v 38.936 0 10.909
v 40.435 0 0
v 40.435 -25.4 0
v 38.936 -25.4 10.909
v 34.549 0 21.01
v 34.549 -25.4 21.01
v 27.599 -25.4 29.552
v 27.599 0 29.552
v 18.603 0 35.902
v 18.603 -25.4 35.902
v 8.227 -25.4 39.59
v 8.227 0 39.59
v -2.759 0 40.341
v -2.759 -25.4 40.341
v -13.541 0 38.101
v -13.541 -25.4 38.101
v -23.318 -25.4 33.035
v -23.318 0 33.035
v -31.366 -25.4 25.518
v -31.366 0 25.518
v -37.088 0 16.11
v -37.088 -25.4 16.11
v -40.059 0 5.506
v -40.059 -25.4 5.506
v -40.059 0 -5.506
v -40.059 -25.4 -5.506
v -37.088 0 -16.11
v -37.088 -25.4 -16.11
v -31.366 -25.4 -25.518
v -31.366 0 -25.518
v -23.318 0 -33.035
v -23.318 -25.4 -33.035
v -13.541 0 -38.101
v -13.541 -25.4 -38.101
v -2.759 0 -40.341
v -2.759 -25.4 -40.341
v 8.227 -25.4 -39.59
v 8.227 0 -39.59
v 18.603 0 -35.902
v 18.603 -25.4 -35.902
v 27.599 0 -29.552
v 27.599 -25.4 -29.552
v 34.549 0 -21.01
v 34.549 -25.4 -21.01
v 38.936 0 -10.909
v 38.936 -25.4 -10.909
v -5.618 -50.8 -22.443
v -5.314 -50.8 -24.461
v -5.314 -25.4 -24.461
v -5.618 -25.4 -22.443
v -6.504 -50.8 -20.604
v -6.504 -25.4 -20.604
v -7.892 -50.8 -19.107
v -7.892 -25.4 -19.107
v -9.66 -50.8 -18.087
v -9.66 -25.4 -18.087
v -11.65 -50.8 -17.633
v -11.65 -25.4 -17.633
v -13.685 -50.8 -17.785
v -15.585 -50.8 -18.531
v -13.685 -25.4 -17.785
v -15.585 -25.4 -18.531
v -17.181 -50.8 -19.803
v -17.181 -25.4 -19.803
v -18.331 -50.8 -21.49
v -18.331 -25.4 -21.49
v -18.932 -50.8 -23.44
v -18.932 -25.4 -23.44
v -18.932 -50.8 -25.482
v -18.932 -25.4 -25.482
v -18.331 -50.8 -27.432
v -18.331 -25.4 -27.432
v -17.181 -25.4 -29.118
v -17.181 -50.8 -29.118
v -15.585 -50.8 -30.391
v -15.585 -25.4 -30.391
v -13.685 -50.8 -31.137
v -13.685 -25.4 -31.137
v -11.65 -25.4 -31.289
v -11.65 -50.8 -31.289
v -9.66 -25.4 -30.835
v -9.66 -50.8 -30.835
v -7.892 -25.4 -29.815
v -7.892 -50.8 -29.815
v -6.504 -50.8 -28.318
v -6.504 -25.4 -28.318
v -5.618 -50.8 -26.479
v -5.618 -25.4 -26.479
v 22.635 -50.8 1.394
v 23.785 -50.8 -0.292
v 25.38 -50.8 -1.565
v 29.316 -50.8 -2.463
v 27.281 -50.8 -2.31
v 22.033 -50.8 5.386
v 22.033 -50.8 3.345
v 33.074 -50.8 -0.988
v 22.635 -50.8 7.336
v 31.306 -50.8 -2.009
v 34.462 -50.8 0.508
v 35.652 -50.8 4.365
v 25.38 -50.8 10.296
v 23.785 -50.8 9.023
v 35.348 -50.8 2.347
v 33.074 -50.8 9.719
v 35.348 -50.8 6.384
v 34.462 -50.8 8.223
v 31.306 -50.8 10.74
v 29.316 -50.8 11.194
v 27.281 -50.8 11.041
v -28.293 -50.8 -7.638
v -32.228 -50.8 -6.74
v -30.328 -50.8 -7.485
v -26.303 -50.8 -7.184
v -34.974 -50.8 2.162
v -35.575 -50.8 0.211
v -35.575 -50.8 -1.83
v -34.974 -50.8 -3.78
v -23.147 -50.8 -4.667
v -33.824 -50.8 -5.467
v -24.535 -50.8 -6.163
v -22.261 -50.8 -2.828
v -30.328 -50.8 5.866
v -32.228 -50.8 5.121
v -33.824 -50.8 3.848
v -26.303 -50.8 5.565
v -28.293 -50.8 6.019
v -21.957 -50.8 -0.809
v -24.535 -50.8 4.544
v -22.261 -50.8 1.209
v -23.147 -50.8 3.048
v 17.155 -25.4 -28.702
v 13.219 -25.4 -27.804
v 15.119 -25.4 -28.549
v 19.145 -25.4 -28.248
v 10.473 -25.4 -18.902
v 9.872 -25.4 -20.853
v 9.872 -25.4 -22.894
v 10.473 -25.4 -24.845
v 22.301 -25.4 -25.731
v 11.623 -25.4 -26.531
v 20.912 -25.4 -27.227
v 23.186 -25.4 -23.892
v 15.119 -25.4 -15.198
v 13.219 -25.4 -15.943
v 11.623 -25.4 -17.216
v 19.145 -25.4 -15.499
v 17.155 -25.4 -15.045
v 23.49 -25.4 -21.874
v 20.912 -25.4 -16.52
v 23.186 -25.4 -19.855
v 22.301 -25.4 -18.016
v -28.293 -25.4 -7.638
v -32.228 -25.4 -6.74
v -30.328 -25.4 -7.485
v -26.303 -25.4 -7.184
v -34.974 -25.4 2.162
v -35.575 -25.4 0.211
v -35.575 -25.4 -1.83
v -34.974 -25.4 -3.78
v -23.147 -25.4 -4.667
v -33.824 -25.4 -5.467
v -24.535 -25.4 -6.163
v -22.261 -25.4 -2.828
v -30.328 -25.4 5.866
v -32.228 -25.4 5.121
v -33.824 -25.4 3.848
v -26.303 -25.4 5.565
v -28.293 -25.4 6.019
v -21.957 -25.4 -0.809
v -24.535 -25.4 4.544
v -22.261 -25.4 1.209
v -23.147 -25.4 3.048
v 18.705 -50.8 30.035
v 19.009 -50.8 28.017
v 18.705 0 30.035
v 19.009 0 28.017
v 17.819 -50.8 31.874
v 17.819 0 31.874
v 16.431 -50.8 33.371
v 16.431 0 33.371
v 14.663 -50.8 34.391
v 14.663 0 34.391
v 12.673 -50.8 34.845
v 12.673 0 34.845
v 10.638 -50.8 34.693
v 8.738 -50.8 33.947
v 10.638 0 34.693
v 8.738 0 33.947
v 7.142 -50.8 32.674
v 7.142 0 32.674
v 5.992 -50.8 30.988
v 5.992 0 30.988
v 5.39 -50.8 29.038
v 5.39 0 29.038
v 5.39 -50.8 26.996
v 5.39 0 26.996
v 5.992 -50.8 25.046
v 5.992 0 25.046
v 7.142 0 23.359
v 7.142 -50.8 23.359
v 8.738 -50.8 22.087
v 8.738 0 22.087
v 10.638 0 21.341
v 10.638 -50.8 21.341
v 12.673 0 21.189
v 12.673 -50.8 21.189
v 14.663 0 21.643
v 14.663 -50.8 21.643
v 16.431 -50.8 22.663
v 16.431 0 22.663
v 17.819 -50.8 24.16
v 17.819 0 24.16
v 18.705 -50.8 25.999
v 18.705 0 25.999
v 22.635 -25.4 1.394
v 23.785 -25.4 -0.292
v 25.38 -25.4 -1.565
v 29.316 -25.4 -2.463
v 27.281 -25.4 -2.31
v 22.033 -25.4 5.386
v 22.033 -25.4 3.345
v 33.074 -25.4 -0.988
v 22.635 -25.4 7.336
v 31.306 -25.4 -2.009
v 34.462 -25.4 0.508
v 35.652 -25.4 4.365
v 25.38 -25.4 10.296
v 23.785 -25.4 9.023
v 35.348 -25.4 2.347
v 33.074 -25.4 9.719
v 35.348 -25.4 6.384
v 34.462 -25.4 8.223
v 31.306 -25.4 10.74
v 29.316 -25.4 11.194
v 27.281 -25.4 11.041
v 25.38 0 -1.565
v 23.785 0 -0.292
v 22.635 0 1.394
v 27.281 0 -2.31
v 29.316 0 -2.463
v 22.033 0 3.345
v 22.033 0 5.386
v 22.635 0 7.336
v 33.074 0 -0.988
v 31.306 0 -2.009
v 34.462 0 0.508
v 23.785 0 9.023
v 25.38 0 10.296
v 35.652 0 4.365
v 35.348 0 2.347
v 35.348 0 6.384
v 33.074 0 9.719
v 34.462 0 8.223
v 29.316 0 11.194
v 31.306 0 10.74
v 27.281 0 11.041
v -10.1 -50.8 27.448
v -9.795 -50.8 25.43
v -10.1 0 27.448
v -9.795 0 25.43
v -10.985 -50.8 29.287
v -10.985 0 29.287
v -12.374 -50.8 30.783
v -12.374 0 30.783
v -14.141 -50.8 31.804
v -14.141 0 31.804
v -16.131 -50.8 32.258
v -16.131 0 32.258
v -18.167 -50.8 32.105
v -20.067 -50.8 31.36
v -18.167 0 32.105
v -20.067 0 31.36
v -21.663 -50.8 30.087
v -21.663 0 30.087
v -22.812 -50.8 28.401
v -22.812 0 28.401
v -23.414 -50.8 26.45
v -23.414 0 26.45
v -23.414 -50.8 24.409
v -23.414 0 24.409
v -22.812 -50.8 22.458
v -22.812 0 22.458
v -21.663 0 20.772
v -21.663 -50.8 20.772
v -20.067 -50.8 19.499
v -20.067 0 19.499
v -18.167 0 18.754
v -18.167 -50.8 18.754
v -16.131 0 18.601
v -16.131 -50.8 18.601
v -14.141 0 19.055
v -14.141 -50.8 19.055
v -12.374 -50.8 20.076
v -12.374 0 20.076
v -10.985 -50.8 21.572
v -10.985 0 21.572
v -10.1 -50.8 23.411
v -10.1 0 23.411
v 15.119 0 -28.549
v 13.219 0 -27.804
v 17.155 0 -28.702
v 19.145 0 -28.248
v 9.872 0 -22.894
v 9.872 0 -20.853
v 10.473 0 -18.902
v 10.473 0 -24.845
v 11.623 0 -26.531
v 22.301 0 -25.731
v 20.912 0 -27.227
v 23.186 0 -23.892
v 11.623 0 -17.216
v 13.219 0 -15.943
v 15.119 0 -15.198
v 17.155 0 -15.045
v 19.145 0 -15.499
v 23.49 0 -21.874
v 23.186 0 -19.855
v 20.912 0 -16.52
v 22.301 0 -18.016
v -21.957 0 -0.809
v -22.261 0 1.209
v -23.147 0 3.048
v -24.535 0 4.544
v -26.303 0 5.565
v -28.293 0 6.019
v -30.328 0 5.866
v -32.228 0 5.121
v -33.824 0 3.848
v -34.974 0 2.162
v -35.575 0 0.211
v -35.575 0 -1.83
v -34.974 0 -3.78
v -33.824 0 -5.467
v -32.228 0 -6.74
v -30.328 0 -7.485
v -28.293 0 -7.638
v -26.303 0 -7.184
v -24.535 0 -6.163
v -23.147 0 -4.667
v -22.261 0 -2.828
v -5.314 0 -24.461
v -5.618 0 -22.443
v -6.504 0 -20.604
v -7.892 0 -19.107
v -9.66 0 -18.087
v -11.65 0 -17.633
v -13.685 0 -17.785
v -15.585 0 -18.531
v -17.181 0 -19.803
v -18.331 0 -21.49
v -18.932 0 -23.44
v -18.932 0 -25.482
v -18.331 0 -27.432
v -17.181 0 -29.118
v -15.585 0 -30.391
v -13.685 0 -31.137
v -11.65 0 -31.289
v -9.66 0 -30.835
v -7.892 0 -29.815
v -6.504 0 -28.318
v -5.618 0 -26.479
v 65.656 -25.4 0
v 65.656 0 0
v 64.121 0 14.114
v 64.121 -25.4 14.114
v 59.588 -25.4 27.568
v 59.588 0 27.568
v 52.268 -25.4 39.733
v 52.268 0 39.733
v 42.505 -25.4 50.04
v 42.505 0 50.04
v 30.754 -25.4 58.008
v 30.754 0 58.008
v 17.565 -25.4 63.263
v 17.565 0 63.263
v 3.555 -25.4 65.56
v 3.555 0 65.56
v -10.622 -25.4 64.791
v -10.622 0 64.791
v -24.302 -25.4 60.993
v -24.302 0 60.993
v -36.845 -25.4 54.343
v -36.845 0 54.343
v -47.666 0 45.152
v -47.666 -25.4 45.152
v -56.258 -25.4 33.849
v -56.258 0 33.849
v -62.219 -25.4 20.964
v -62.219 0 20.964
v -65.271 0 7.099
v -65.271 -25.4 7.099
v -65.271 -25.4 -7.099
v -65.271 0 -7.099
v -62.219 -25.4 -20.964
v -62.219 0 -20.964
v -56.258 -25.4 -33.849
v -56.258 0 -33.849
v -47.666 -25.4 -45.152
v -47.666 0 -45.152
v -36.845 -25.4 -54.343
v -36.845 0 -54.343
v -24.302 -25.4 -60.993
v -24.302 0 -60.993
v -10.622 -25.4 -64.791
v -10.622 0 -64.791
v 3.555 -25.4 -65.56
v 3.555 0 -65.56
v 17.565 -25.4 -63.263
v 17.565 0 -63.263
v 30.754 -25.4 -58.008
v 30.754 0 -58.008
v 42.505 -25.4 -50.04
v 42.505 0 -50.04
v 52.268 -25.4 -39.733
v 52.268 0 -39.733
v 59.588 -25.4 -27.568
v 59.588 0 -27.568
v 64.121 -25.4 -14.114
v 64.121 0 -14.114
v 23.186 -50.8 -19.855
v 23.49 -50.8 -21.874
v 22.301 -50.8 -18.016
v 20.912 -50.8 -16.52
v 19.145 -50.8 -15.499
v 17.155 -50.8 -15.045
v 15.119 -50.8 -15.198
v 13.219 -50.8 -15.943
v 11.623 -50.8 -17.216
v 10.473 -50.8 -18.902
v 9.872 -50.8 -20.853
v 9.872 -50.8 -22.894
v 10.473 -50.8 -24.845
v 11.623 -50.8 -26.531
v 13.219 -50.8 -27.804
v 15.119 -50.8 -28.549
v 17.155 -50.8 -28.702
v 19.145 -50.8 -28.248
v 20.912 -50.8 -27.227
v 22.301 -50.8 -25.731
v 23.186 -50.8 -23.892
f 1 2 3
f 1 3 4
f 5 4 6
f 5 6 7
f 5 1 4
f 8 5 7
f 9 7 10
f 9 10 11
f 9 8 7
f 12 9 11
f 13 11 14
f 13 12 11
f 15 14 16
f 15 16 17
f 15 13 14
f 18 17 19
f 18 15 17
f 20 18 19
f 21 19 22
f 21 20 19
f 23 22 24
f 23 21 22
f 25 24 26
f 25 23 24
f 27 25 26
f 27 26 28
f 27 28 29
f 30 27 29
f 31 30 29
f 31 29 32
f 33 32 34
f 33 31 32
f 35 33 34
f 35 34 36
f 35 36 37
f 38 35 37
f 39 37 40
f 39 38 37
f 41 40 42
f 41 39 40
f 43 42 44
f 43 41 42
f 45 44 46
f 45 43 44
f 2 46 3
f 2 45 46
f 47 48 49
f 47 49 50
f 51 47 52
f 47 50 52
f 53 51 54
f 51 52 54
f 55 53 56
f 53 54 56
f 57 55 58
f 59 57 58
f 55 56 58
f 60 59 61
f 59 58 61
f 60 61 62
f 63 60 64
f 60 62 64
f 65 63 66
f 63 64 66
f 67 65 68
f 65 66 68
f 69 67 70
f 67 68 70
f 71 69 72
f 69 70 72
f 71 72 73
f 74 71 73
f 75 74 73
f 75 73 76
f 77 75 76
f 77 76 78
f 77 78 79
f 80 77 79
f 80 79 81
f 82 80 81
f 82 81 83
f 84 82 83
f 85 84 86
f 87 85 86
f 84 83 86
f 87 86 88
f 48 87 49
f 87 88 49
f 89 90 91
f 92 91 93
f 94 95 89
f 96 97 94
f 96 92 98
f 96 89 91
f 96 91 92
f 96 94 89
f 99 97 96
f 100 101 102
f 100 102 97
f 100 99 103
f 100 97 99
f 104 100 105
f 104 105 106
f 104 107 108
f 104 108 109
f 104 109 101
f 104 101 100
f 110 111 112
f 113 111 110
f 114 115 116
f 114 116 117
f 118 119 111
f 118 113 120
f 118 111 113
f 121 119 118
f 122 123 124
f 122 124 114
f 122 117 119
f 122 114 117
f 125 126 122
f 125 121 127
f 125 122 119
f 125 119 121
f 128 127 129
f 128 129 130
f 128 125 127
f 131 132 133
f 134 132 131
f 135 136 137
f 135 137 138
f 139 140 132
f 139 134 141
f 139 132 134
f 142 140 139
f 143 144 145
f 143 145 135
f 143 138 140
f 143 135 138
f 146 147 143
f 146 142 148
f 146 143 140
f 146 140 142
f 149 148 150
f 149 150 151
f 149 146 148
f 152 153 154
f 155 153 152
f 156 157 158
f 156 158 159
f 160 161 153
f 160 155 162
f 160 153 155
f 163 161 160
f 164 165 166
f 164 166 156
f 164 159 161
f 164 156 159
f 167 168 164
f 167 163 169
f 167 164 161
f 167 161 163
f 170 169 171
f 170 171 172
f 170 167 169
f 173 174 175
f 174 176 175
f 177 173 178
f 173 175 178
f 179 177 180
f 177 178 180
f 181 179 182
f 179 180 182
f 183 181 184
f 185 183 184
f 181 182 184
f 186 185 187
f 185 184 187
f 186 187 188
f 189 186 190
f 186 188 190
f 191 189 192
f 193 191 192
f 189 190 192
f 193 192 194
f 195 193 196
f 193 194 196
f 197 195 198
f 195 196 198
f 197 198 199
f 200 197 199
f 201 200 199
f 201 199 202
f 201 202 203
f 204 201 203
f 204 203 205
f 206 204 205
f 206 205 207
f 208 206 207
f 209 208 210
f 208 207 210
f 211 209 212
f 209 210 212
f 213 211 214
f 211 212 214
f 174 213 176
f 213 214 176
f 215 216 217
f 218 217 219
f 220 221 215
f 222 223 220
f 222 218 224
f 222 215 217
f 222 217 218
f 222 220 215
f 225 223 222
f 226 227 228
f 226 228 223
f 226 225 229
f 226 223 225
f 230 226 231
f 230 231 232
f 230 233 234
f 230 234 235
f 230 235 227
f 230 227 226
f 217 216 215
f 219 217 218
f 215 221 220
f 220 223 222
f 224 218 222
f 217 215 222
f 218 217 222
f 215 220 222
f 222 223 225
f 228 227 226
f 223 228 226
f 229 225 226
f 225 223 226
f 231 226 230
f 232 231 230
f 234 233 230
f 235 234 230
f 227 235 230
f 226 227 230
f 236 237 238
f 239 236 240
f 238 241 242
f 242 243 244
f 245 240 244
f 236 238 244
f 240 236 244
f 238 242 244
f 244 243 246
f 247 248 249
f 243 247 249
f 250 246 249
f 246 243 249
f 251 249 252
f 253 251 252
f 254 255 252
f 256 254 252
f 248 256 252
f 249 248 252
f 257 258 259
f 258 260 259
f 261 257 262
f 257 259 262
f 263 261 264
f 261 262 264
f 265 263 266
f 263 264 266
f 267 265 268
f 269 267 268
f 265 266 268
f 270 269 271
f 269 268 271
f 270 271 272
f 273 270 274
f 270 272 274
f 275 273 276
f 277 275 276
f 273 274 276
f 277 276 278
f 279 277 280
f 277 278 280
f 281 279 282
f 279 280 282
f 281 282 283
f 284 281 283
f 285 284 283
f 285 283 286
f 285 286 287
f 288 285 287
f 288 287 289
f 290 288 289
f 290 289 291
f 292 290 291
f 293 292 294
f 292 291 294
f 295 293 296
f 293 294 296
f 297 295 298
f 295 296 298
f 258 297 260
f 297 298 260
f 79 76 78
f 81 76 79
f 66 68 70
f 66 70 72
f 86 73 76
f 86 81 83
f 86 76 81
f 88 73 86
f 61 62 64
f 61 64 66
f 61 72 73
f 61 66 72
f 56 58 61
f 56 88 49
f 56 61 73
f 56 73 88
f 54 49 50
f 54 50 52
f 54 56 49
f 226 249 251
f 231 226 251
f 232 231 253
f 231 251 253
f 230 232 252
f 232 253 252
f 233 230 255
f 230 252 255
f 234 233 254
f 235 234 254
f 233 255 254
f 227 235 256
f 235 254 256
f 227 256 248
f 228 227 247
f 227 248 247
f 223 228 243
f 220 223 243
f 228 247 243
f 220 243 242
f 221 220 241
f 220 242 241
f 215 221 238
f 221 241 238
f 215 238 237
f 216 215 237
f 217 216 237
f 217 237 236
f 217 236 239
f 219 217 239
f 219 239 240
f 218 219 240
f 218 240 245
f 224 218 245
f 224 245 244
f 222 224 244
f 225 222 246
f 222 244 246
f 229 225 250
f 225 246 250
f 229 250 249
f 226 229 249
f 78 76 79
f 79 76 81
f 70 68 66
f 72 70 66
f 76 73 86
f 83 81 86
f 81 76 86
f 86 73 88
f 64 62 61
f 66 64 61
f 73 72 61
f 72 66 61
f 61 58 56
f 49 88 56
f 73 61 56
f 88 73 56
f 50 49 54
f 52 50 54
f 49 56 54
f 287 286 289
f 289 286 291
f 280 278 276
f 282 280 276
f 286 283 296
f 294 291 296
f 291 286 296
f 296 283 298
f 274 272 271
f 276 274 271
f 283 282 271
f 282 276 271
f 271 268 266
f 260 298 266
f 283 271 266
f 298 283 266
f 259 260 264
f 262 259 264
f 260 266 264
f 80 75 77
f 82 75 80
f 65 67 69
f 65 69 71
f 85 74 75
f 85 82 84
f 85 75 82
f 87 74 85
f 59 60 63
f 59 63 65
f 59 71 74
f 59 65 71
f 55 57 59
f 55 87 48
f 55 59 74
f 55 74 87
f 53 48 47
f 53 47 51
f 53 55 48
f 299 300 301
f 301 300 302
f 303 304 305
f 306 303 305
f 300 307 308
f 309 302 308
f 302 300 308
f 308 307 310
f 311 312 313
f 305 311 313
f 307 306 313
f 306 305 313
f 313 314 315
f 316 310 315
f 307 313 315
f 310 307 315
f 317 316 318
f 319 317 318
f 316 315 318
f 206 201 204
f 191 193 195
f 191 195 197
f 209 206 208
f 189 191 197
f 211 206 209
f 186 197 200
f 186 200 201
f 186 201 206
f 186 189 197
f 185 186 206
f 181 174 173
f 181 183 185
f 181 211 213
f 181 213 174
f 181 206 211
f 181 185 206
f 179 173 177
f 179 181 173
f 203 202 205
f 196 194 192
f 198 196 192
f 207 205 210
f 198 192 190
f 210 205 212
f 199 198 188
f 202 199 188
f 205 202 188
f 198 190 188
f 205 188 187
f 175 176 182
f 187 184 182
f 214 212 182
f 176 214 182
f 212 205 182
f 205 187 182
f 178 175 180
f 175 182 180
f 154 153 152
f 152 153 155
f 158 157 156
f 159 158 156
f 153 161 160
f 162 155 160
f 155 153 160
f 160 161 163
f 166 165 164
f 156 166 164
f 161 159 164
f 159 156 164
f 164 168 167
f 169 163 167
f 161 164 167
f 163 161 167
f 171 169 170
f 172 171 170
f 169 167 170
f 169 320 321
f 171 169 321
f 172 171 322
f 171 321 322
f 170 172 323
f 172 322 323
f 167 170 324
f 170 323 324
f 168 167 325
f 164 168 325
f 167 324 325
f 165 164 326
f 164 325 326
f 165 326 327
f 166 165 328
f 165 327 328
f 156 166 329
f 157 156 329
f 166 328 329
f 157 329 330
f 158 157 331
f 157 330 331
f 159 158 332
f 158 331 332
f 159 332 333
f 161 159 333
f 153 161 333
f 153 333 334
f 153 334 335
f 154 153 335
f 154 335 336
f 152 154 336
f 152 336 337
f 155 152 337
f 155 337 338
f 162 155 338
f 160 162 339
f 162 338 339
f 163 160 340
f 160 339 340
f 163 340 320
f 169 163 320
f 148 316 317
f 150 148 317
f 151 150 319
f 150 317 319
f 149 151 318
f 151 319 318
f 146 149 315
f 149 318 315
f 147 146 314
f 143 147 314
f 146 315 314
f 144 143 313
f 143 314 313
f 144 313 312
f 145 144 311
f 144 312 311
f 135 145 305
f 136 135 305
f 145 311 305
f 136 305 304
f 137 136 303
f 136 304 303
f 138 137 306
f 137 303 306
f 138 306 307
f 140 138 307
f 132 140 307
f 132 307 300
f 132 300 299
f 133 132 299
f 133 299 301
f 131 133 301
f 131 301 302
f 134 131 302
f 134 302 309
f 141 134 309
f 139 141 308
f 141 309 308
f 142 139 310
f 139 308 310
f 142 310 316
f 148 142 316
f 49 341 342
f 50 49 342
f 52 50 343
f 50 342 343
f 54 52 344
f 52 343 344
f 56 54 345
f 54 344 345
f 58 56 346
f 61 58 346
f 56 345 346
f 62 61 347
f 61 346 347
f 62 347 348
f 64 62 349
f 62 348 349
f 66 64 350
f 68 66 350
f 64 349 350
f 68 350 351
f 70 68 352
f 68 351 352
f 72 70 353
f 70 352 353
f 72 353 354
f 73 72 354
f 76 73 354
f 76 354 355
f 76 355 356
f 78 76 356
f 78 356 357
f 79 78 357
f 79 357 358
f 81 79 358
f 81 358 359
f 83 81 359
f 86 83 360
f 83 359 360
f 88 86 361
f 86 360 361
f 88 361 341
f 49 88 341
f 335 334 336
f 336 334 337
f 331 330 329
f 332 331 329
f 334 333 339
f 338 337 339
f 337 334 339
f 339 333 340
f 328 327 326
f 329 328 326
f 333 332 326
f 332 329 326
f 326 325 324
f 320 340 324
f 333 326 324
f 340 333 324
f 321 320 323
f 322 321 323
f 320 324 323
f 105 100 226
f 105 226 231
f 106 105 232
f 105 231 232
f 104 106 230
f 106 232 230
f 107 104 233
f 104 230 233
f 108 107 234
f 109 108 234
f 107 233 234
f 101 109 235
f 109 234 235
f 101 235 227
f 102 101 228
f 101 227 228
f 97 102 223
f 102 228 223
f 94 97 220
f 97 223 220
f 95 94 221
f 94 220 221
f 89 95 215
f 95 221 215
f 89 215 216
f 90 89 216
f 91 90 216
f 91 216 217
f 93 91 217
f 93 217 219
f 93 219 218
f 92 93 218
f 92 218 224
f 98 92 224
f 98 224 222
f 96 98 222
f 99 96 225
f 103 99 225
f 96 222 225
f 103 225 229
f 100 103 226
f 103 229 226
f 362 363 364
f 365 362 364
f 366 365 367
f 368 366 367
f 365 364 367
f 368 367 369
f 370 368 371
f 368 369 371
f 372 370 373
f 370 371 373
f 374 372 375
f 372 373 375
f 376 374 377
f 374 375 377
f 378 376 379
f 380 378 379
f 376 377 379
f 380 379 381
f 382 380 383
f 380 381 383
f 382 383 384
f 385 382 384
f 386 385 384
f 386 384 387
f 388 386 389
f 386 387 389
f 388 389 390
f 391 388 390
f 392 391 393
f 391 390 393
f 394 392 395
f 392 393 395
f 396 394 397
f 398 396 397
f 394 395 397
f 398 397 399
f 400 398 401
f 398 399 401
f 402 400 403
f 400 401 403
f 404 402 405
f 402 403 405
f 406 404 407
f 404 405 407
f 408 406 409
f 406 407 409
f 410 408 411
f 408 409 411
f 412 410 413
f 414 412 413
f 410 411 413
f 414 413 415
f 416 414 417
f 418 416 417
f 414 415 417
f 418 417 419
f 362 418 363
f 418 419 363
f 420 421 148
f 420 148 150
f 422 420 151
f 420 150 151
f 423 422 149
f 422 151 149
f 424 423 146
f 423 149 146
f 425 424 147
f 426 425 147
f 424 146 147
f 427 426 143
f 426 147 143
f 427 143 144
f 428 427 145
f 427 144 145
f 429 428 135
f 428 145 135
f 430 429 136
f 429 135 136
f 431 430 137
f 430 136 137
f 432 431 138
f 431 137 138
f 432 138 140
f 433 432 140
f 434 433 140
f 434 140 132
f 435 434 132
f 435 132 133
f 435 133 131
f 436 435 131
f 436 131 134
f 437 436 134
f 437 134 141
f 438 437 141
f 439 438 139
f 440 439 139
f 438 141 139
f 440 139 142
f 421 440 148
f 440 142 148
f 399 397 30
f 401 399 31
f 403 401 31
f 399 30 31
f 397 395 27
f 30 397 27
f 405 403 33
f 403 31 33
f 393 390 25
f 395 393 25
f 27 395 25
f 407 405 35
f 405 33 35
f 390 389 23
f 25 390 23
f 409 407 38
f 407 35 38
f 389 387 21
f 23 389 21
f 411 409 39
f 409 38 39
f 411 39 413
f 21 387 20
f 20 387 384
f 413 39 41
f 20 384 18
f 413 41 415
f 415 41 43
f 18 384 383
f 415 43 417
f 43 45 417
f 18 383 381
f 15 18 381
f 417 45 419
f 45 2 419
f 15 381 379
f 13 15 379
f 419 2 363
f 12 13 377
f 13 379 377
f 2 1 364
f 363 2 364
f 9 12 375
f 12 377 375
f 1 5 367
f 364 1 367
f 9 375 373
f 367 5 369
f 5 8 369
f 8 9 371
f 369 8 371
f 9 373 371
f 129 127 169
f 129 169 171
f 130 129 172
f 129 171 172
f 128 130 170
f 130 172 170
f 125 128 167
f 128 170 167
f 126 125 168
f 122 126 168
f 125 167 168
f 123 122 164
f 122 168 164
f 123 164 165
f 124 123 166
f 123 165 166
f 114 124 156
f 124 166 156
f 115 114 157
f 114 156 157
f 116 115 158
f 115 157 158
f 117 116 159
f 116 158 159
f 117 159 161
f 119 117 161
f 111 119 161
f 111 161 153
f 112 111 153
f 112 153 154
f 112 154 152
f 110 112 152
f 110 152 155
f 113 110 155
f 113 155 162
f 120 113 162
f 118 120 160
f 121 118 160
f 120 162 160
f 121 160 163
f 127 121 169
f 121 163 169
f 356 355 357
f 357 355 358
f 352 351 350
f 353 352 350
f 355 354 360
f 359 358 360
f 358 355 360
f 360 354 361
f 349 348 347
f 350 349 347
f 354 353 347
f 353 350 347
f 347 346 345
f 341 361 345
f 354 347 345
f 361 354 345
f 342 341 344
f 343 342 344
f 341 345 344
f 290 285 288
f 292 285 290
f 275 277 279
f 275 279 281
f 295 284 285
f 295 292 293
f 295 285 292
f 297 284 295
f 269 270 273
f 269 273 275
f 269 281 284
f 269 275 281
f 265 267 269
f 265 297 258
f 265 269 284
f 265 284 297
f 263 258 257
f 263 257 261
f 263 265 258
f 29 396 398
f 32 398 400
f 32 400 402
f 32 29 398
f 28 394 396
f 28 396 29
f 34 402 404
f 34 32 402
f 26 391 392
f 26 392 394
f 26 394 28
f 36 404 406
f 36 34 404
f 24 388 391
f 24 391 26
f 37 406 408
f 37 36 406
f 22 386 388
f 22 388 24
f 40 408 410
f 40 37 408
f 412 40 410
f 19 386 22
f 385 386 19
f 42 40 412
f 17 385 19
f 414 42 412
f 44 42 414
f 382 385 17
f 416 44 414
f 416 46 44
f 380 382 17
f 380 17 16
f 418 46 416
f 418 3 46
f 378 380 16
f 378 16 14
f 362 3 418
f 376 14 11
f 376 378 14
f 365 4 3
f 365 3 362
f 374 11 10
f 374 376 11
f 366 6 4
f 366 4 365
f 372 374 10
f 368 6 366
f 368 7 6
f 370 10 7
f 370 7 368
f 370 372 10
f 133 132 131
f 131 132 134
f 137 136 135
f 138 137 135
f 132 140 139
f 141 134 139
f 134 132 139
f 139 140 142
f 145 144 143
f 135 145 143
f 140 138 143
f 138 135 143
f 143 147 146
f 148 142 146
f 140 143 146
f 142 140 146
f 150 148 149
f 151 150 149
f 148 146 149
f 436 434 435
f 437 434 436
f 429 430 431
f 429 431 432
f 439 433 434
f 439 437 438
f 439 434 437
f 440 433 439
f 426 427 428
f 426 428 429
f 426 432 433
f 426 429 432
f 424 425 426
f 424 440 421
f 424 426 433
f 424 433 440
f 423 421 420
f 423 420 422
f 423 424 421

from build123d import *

# Parameters (mm, degrees)
F0_R     = 65.6559309804
F0_R_2   = 40.4354066136
F3_DEPTH = 25.4
F4_R     = 6.847573374
F5_DEPTH = 25.4
F6_DEPTH = 25.4
F7_DEPTH = 25.4
F8_DEPTH = 25.4


# Not quite as in the source:
# - the program builds the solid bodies; features that only make, move or delete a surface that nothing else refers to are left out


with BuildPart() as f3:
    # F0 (on Front) → F3 (new body)
    with BuildSketch(Plane.XZ):
        Circle(F0_R)
        Circle(F0_R_2, mode=Mode.SUBTRACT)
    extrude(amount=F3_DEPTH)


with BuildPart() as f5:
    # F4 (on Front) → F5 (new body)
    with BuildSketch(Plane.XZ):
        with Locations((12.1613769004, 28.0169486328)):
            Circle(F4_R)
    extrude(amount=F5_DEPTH)

    # F8 (add): a face of the model
    f8_faces = [f5.faces().sort_by_distance(p)[0] for p in [
        (12.1613769004, -25.4, 28.0169486328),
    ]]
    extrude(f8_faces, amount=F8_DEPTH)


with BuildPart() as f5b:
    # F4 (on Front) → F5, piece 2 (new body)
    with BuildSketch(Plane.XZ):
        with Locations((-16.6429076344, 25.4295356572)):
            Circle(F4_R)
    extrude(amount=F5_DEPTH)

    # F7 (add): a face of the model
    f7_faces = [f5b.faces().sort_by_distance(p)[0] for p in [
        (-16.6429076344, -25.4, 25.4295356572),
    ]]
    extrude(f7_faces, amount=F7_DEPTH)


with BuildPart() as f5c:
    # F4 (on Front) → F5, piece 3 (new body)
    with BuildSketch(Plane.XZ):
        with Locations((-28.8042845348, -0.8094129756)):
            Circle(F4_R)
    extrude(amount=F5_DEPTH)


with BuildPart() as f5d:
    # F4 (on Front) → F5, piece 4 (new body)
    with BuildSketch(Plane.XZ):
        with Locations((-12.1613769004, -24.4609486328)):
            Circle(F4_R)
    extrude(amount=F5_DEPTH)


with BuildPart() as f5e:
    # F4 (on Front) → F5, piece 5 (new body)
    with BuildSketch(Plane.XZ):
        with Locations((16.6429076344, -21.8735356572)):
            Circle(F4_R)
    extrude(amount=F5_DEPTH)


with BuildPart() as f5f:
    # F4 (on Front) → F5, piece 6 (new body)
    with BuildSketch(Plane.XZ):
        with Locations((28.8042845348, 4.3654129756)):
            Circle(F4_R)
    extrude(amount=F5_DEPTH)


with BuildPart() as f6:
    # F6 (new): a face of the model
    f6_faces = [f5d.part.faces().sort_by_distance(p)[0] for p in [
        (-12.1613769004, -25.4, -24.4609486328),
    ]]
    extrude(f6_faces, amount=F6_DEPTH)


with BuildPart() as f6b:
    # F6#2 (new): a face of the model
    f6_2_faces = [f5e.part.faces().sort_by_distance(p)[0] for p in [
        (16.6429076344, -25.4, -21.8735356572),
    ]]
    extrude(f6_2_faces, amount=F6_DEPTH)


with BuildPart() as f6c:
    # F6#3 (new): a face of the model
    f6_3_faces = [f5f.part.faces().sort_by_distance(p)[0] for p in [
        (28.8042845348, -25.4, 4.3654129756),
    ]]
    extrude(f6_3_faces, amount=F6_DEPTH)


with BuildPart() as f6d:
    # F6#4 (new): a face of the model
    f6_4_faces = [f5c.part.faces().sort_by_distance(p)[0] for p in [
        (-28.8042845348, -25.4, -0.8094129756),
    ]]
    extrude(f6_4_faces, amount=F6_DEPTH)


solid = Compound([f3.part, f5.part, f5b.part, f5c.part, f5d.part, f5e.part, f5f.part, f6.part, f6b.part, f6c.part, f6d.part])
